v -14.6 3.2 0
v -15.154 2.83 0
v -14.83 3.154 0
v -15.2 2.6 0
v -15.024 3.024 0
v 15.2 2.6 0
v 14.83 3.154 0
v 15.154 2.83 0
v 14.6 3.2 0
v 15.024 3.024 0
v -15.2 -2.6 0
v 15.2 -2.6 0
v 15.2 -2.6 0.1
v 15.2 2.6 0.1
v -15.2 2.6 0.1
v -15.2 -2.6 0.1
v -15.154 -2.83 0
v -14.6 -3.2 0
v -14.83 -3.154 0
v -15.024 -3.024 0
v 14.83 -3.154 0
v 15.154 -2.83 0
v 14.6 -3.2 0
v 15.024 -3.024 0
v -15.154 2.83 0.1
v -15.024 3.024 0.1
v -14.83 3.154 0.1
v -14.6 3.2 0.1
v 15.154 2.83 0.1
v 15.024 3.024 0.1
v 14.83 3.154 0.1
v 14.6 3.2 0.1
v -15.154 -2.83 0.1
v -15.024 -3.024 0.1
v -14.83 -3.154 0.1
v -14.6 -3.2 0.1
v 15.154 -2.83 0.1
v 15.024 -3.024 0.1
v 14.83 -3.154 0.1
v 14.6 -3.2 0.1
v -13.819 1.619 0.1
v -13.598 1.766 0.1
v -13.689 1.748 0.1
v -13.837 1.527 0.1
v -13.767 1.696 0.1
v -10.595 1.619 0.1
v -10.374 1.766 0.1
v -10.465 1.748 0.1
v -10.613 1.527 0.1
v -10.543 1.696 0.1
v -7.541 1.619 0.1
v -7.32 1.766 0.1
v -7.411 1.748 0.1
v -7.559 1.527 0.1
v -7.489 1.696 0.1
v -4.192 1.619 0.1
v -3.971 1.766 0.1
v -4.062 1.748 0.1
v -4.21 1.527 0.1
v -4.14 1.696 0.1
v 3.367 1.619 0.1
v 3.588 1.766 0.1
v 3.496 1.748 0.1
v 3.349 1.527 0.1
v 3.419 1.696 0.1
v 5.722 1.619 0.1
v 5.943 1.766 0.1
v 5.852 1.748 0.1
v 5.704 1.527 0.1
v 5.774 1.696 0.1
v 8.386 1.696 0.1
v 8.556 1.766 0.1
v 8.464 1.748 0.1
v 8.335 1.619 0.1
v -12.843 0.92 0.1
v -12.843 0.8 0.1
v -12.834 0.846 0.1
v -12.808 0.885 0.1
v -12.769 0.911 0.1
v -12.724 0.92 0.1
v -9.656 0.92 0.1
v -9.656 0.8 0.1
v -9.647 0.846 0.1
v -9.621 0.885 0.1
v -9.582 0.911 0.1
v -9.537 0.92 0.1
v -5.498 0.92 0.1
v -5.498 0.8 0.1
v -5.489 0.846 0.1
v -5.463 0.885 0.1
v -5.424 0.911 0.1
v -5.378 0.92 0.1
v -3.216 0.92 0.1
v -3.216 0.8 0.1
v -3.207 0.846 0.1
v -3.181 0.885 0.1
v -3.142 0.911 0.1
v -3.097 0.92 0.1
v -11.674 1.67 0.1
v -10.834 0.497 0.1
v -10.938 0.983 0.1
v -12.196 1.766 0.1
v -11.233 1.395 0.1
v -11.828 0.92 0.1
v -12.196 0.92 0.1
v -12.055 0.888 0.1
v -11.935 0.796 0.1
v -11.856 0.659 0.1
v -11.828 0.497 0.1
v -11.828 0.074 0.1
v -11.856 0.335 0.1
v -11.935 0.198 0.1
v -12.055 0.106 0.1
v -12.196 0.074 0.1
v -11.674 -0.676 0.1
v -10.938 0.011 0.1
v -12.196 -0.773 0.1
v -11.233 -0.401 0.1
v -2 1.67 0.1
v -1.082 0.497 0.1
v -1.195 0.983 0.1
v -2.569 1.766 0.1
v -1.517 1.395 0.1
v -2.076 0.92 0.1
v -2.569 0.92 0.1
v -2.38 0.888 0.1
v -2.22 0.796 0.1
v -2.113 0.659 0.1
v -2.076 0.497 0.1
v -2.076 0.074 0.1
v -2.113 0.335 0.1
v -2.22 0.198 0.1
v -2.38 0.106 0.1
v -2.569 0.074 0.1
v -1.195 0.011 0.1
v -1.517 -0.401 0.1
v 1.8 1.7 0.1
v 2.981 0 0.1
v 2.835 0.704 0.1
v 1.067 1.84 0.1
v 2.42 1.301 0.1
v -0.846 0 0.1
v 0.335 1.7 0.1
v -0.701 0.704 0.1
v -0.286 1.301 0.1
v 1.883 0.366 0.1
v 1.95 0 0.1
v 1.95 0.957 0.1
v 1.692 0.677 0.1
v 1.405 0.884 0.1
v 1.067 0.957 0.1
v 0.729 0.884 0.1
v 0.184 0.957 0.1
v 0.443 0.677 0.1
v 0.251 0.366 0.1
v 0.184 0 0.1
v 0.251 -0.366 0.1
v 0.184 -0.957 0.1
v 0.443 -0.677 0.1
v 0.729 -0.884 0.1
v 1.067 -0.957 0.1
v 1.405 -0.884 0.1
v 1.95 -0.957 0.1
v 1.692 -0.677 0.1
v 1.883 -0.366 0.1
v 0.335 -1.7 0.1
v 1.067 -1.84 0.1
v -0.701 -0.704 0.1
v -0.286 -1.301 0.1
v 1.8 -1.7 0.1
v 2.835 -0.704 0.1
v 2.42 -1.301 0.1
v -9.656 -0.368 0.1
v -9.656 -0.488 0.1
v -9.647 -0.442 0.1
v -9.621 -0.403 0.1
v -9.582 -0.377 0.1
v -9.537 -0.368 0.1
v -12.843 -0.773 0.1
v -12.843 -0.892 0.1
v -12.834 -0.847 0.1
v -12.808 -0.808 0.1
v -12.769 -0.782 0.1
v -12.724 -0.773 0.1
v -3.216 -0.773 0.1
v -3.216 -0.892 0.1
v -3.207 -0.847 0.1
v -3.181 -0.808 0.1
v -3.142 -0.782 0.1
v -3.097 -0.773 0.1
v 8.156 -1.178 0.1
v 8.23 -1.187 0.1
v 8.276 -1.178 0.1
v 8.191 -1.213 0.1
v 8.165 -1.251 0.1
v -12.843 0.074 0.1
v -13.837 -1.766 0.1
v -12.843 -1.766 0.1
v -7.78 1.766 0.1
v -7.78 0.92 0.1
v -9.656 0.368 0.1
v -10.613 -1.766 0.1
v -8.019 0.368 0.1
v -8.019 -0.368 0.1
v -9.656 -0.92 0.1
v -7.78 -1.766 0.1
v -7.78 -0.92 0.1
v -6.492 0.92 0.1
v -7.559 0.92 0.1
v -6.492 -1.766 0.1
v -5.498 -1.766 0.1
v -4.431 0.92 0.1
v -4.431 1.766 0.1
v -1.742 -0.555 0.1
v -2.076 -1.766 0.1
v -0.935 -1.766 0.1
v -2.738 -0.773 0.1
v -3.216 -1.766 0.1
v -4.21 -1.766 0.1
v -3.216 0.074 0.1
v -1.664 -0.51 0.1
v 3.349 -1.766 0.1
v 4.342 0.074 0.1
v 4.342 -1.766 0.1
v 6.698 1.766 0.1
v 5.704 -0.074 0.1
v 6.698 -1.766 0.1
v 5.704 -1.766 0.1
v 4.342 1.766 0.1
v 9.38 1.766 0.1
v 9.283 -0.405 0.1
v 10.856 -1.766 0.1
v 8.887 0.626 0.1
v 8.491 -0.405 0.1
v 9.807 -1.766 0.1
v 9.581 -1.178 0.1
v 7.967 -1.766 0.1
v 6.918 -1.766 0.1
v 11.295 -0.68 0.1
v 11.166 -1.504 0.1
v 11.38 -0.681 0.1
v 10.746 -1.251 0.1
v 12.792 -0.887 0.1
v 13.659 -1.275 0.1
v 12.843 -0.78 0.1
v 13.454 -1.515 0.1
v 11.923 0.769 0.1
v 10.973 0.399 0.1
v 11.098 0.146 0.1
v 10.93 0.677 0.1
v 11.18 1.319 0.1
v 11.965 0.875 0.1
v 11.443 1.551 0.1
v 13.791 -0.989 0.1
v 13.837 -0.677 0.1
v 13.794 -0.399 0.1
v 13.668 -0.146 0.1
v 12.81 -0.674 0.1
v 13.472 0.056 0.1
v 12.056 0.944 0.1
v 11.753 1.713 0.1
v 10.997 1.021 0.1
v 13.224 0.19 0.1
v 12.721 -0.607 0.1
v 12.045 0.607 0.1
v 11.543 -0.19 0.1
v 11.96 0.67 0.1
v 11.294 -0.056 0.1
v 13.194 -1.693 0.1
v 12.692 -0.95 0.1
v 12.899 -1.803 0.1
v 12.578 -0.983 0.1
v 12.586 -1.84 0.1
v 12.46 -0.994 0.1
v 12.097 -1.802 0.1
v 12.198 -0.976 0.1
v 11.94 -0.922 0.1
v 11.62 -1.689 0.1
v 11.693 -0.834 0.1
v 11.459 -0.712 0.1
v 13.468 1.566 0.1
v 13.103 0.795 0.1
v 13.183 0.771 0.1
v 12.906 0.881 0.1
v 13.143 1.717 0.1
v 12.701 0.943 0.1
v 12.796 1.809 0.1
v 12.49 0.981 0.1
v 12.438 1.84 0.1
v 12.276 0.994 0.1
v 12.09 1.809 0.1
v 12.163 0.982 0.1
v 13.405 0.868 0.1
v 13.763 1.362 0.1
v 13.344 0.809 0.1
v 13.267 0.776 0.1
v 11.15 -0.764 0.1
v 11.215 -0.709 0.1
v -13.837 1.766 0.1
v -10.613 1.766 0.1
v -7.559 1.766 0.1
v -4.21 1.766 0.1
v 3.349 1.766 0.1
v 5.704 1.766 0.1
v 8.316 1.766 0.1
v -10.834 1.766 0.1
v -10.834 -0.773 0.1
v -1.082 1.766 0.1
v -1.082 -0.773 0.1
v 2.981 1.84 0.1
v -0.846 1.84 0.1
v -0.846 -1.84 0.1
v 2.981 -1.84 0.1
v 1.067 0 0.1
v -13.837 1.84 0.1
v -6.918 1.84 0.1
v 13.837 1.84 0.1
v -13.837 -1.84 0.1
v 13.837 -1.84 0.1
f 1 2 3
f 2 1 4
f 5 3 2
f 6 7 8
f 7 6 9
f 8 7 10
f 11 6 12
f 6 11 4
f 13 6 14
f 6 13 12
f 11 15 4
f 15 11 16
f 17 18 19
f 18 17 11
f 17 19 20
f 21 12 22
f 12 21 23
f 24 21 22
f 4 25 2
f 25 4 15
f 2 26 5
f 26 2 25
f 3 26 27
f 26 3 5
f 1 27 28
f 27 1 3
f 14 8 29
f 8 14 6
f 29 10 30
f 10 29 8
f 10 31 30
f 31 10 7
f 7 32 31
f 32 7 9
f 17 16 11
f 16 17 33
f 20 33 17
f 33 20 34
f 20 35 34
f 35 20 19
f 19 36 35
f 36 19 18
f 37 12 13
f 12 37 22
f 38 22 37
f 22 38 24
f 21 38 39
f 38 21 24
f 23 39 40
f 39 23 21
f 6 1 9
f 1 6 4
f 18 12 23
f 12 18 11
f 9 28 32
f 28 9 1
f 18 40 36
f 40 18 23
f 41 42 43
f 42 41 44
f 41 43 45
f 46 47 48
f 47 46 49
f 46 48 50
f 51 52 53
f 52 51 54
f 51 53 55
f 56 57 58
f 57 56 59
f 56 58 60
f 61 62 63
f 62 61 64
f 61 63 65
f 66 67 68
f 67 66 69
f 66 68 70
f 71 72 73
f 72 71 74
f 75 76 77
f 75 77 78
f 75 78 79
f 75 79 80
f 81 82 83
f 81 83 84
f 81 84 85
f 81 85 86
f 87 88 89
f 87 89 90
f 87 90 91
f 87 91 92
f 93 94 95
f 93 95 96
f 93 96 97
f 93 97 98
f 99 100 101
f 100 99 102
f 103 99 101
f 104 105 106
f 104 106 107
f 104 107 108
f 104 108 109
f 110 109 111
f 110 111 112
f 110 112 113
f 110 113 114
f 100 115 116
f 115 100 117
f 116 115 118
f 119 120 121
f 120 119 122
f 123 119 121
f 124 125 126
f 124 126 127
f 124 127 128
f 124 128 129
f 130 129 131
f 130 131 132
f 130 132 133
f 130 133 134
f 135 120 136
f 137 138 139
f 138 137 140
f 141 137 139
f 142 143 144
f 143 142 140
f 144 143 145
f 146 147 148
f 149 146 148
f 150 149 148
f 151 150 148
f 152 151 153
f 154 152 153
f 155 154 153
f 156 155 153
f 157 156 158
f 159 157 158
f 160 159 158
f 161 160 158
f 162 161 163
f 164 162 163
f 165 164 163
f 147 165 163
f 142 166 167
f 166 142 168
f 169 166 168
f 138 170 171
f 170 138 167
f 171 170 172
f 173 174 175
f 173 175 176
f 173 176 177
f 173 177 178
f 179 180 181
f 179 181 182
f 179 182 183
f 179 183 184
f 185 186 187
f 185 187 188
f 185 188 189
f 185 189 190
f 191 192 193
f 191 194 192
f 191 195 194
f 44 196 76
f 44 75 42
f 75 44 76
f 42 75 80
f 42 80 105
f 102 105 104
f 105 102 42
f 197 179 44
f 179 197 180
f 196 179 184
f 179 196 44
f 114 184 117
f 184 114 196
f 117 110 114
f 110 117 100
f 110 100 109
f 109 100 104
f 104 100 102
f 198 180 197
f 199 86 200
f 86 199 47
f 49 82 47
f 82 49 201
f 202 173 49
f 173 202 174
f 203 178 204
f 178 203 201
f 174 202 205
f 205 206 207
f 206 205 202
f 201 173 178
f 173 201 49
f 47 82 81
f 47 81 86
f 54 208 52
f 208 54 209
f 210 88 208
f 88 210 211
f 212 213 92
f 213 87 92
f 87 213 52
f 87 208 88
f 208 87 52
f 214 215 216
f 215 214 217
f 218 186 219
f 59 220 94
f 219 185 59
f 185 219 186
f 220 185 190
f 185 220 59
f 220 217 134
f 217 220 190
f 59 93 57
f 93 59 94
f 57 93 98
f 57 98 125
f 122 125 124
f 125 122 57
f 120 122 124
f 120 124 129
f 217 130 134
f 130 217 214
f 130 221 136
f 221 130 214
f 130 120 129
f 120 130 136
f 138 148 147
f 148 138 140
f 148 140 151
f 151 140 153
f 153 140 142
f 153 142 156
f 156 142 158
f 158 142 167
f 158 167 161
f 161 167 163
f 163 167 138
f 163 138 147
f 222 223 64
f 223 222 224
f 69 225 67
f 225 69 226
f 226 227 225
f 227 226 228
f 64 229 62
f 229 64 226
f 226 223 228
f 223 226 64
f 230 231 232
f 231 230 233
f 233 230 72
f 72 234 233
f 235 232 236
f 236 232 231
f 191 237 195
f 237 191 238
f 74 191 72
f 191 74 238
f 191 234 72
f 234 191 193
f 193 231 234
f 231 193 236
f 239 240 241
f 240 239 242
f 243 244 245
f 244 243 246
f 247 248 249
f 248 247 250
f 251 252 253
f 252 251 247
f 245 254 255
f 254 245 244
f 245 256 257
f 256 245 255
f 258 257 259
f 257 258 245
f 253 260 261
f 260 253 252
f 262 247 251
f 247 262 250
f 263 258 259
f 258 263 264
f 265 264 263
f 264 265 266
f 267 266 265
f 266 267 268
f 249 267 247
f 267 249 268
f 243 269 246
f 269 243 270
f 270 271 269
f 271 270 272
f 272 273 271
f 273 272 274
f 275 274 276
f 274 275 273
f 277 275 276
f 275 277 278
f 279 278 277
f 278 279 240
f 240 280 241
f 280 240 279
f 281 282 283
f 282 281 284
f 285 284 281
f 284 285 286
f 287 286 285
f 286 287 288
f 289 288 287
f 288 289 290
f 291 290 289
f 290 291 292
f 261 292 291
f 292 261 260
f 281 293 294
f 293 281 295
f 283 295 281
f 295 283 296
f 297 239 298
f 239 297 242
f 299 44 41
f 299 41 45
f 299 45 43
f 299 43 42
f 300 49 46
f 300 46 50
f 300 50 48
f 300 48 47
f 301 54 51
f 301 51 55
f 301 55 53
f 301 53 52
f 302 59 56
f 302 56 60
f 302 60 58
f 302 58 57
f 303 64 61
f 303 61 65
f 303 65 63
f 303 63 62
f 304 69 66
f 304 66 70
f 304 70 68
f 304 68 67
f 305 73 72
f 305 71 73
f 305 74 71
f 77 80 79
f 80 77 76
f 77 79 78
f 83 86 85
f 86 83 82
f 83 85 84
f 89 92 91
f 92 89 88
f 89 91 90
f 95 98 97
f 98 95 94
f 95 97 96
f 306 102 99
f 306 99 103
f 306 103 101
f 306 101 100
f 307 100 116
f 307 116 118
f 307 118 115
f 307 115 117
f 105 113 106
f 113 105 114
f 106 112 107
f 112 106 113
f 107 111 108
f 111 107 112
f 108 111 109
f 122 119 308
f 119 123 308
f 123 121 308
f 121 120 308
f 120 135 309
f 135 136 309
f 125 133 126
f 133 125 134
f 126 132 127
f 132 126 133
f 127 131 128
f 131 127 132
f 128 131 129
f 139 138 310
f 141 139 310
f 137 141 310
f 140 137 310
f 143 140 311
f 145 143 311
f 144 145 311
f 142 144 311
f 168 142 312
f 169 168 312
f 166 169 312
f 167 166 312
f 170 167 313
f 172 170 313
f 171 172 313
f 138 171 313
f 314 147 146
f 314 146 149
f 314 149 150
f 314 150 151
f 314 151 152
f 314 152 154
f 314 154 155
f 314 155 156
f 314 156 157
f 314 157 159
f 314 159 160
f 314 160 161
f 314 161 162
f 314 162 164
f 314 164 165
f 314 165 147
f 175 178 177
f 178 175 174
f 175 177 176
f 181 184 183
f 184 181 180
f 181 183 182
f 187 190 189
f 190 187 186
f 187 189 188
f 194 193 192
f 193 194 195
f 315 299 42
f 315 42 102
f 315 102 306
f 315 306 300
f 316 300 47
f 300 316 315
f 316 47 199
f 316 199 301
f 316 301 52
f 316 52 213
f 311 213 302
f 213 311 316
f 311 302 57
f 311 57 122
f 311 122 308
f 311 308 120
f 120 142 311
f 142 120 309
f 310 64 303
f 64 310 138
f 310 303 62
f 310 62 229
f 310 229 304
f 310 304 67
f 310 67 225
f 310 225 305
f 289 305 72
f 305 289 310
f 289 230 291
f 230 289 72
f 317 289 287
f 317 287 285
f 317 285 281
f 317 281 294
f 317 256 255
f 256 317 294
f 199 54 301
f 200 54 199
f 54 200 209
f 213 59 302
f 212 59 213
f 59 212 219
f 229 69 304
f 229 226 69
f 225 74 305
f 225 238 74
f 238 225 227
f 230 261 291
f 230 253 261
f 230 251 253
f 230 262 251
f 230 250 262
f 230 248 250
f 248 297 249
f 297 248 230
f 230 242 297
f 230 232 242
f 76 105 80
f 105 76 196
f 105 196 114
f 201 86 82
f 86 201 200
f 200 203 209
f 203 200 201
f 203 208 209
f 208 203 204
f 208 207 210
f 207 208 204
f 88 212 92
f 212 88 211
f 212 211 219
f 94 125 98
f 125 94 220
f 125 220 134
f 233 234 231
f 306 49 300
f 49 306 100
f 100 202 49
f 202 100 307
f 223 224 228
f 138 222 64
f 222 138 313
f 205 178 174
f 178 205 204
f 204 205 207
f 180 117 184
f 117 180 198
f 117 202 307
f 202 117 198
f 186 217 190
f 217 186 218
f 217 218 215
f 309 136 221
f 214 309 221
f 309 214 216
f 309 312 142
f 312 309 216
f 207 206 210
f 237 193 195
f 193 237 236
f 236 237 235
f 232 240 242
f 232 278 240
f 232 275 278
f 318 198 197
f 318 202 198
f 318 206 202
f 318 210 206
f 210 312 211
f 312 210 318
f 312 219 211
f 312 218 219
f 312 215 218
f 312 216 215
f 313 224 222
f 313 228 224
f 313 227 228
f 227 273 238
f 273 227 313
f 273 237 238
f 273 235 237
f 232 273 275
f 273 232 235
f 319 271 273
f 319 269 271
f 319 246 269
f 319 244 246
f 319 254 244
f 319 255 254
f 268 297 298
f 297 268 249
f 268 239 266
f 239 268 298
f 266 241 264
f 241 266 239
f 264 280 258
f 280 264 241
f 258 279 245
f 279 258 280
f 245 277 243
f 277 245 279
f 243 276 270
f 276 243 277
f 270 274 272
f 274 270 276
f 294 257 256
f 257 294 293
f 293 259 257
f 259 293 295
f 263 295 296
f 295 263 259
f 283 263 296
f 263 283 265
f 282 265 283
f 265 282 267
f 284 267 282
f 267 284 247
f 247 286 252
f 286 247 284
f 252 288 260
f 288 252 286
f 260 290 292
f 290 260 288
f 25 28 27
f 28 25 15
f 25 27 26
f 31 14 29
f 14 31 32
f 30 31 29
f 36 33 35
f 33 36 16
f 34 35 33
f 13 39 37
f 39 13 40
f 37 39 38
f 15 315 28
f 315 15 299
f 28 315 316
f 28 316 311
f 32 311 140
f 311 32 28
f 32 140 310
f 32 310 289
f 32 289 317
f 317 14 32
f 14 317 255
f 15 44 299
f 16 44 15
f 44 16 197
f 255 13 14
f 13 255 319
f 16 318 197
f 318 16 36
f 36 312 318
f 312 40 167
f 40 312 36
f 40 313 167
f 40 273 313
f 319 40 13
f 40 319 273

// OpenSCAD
use <../lib.scad>
use <../p/1-4chrd.scad>
use <../p/logo-petronas-text-box.scad>
use <../p/logo-petronas-text.scad>
use <s/stickerback008x038.scad>
function ldraw_lib__6177973b() = [
// 0 Sticker  0.8 x  3.8 with White "PETRONAS" on Green Background
// 0 Name: 6177973b.dat
// 0 Author: Massimo Maso [Sirio]
// 0 !LDRAW_ORG Part UPDATE 2026-07
// 0 !LICENSE Licensed under CC BY 4.0 : see CAreadme.txt
// 
// 0 BFC CERTIFY CCW
  [0,"BFC","CERTIFY"],
  [0,"BFC","CCW"],
// 
// 0 !CATEGORY Sticker
// 0 !KEYWORDS 2016, 44, 6, AMG, BrickLink 75883stk01, Brickowl 129746, F1
// 0 !KEYWORDS Formula one, Hybrid, Lewis Hamilton, Mercedes Team, Nico Rosberg
// 0 !KEYWORDS Rebrickable 30901, Set 75883, Set 75995, Speed Champions, Toto Wolff
// 0 !KEYWORDS W07
// 
// 0 !HISTORY 2026-07-30 [OrionP] Official Update 2026-07
// 
// 0 // Stickerback
// 1 16 0 0 0 1 0 0 0 1 0 0 0 1 s\stickerback008x038.dat
  [1,16,0,0,0,1,0,0,0,1,0,0,0,1, ldraw_lib__s__stickerback008x038()],
// 0 // Logo primitives
// 1 15 0 -.25 0 .92 0 0 0 1 0 0 0 .92 logo-petronas-text.dat
  [1,15,0,-.25,0,.92,0,0,0,1,0,0,0,.92, ldraw_lib__logo_petronas_text()],
// 1 2 0 -.25 0 .92 0 0 0 1 0 0 0 .92 logo-petronas-text-box.dat
  [1,2,0,-.25,0,.92,0,0,0,1,0,0,0,.92, ldraw_lib__logo_petronas_text_box()],
// 0 // Primitives
// 1 2 -36.5 -.25 6.5 -1.5 0 0 0 1 0 0 0 1.5 1-4chrd.dat
  [1,2,-36.5,-.25,6.5,-1.5,0,0,0,1,0,0,0,1.5, ldraw_lib__1_4chrd()],
// 1 2 36.5 -.25 6.5 1.5 0 0 0 1 0 0 0 1.5 1-4chrd.dat
  [1,2,36.5,-.25,6.5,1.5,0,0,0,1,0,0,0,1.5, ldraw_lib__1_4chrd()],
// 1 2 -36.5 -.25 -6.5 -1.5 0 0 0 1 0 0 0 -1.5 1-4chrd.dat
  [1,2,-36.5,-.25,-6.5,-1.5,0,0,0,1,0,0,0,-1.5, ldraw_lib__1_4chrd()],
// 1 2 36.5 -.25 -6.5 1.5 0 0 0 1 0 0 0 -1.5 1-4chrd.dat
  [1,2,36.5,-.25,-6.5,1.5,0,0,0,1,0,0,0,-1.5, ldraw_lib__1_4chrd()],
// 0 // Top face
// 0 // Green faces
// 4 2 -36.5 -.25 8 -38 -.25 6.5 -34.592 -.25 4.416 -34.592 -.25 4.6
  [4,2,-36.5,-.25,8,-38,-.25,6.5,-34.592,-.25,4.416,-34.592,-.25,4.6],
// 3 2 -36.5 -.25 8 -34.592 -.25 4.6 -17.296 -.25 4.6
  [3,2,-36.5,-.25,8,-34.592,-.25,4.6,-17.296,-.25,4.6],
// 3 2 -36.5 -.25 8 -17.296 -.25 4.6 -2.116 -.25 4.6
  [3,2,-36.5,-.25,8,-17.296,-.25,4.6,-2.116,-.25,4.6],
// 4 2 -36.5 -.25 8 -2.116 -.25 4.6 2.668 -.25 4.6 36.5 -.25 8
  [4,2,-36.5,-.25,8,-2.116,-.25,4.6,2.668,-.25,4.6,36.5,-.25,8],
// 3 2 36.5 -.25 8 2.668 -.25 4.6 7.452 -.25 4.6
  [3,2,36.5,-.25,8,2.668,-.25,4.6,7.452,-.25,4.6],
// 3 2 36.5 -.25 8 7.452 -.25 4.6 31.096 -.25 4.6
  [3,2,36.5,-.25,8,7.452,-.25,4.6,31.096,-.25,4.6],
// 3 2 36.5 -.25 8 31.096 -.25 4.6 34.592 -.25 4.6
  [3,2,36.5,-.25,8,31.096,-.25,4.6,34.592,-.25,4.6],
// 4 2 36.5 -.25 8 34.592 -.25 4.6 34.592 -.25 -1.6928 38 -.25 6.5
  [4,2,36.5,-.25,8,34.592,-.25,4.6,34.592,-.25,-1.6928,38,-.25,6.5],
// 3 2 -38 -.25 6.5 -34.592 -.25 3.818 -34.592 -.25 4.416
  [3,2,-38,-.25,6.5,-34.592,-.25,3.818,-34.592,-.25,4.416],
// 4 2 -38 -.25 6.5 -38 -.25 -6.5 -34.592 -.25 -4.416 -34.592 -.25 3.818
  [4,2,-38,-.25,6.5,-38,-.25,-6.5,-34.592,-.25,-4.416,-34.592,-.25,3.818],
// 4 2 38 -.25 6.5 34.592 -.25 -1.6928 34.592 -.25 -4.6 38 -.25 -6.5
  [4,2,38,-.25,6.5,34.592,-.25,-1.6928,34.592,-.25,-4.6,38,-.25,-6.5],
// 4 2 -36.5 -.25 -8 -34.592 -.25 -4.6 -34.592 -.25 -4.416 -38 -.25 -6.5
  [4,2,-36.5,-.25,-8,-34.592,-.25,-4.6,-34.592,-.25,-4.416,-38,-.25,-6.5],
// 3 2 -36.5 -.25 -8 -2.116 -.25 -4.6 -34.592 -.25 -4.6
  [3,2,-36.5,-.25,-8,-2.116,-.25,-4.6,-34.592,-.25,-4.6],
// 4 2 -36.5 -.25 -8 36.5 -.25 -8 2.668 -.25 -4.6 -2.116 -.25 -4.6
  [4,2,-36.5,-.25,-8,36.5,-.25,-8,2.668,-.25,-4.6,-2.116,-.25,-4.6],
// 3 2 36.5 -.25 -8 7.452 -.25 -4.6 2.668 -.25 -4.6
  [3,2,36.5,-.25,-8,7.452,-.25,-4.6,2.668,-.25,-4.6],
// 3 2 36.5 -.25 -8 31.464 -.25 -4.6 7.452 -.25 -4.6
  [3,2,36.5,-.25,-8,31.464,-.25,-4.6,7.452,-.25,-4.6],
// 4 2 36.5 -.25 -8 38 -.25 -6.5 34.592 -.25 -4.6 31.464 -.25 -4.6
  [4,2,36.5,-.25,-8,38,-.25,-6.5,34.592,-.25,-4.6,31.464,-.25,-4.6],
];
module ldraw_lib__6177973b(step=0, col=false, unit=2/5, alt=false, line=0.2, solid=!$preview)
    makepoly(ldraw_lib__6177973b(), step=step, col=col, unit=unit, alt=alt, line=line, solid=solid);
ldraw_lib__6177973b(line=0.2);
